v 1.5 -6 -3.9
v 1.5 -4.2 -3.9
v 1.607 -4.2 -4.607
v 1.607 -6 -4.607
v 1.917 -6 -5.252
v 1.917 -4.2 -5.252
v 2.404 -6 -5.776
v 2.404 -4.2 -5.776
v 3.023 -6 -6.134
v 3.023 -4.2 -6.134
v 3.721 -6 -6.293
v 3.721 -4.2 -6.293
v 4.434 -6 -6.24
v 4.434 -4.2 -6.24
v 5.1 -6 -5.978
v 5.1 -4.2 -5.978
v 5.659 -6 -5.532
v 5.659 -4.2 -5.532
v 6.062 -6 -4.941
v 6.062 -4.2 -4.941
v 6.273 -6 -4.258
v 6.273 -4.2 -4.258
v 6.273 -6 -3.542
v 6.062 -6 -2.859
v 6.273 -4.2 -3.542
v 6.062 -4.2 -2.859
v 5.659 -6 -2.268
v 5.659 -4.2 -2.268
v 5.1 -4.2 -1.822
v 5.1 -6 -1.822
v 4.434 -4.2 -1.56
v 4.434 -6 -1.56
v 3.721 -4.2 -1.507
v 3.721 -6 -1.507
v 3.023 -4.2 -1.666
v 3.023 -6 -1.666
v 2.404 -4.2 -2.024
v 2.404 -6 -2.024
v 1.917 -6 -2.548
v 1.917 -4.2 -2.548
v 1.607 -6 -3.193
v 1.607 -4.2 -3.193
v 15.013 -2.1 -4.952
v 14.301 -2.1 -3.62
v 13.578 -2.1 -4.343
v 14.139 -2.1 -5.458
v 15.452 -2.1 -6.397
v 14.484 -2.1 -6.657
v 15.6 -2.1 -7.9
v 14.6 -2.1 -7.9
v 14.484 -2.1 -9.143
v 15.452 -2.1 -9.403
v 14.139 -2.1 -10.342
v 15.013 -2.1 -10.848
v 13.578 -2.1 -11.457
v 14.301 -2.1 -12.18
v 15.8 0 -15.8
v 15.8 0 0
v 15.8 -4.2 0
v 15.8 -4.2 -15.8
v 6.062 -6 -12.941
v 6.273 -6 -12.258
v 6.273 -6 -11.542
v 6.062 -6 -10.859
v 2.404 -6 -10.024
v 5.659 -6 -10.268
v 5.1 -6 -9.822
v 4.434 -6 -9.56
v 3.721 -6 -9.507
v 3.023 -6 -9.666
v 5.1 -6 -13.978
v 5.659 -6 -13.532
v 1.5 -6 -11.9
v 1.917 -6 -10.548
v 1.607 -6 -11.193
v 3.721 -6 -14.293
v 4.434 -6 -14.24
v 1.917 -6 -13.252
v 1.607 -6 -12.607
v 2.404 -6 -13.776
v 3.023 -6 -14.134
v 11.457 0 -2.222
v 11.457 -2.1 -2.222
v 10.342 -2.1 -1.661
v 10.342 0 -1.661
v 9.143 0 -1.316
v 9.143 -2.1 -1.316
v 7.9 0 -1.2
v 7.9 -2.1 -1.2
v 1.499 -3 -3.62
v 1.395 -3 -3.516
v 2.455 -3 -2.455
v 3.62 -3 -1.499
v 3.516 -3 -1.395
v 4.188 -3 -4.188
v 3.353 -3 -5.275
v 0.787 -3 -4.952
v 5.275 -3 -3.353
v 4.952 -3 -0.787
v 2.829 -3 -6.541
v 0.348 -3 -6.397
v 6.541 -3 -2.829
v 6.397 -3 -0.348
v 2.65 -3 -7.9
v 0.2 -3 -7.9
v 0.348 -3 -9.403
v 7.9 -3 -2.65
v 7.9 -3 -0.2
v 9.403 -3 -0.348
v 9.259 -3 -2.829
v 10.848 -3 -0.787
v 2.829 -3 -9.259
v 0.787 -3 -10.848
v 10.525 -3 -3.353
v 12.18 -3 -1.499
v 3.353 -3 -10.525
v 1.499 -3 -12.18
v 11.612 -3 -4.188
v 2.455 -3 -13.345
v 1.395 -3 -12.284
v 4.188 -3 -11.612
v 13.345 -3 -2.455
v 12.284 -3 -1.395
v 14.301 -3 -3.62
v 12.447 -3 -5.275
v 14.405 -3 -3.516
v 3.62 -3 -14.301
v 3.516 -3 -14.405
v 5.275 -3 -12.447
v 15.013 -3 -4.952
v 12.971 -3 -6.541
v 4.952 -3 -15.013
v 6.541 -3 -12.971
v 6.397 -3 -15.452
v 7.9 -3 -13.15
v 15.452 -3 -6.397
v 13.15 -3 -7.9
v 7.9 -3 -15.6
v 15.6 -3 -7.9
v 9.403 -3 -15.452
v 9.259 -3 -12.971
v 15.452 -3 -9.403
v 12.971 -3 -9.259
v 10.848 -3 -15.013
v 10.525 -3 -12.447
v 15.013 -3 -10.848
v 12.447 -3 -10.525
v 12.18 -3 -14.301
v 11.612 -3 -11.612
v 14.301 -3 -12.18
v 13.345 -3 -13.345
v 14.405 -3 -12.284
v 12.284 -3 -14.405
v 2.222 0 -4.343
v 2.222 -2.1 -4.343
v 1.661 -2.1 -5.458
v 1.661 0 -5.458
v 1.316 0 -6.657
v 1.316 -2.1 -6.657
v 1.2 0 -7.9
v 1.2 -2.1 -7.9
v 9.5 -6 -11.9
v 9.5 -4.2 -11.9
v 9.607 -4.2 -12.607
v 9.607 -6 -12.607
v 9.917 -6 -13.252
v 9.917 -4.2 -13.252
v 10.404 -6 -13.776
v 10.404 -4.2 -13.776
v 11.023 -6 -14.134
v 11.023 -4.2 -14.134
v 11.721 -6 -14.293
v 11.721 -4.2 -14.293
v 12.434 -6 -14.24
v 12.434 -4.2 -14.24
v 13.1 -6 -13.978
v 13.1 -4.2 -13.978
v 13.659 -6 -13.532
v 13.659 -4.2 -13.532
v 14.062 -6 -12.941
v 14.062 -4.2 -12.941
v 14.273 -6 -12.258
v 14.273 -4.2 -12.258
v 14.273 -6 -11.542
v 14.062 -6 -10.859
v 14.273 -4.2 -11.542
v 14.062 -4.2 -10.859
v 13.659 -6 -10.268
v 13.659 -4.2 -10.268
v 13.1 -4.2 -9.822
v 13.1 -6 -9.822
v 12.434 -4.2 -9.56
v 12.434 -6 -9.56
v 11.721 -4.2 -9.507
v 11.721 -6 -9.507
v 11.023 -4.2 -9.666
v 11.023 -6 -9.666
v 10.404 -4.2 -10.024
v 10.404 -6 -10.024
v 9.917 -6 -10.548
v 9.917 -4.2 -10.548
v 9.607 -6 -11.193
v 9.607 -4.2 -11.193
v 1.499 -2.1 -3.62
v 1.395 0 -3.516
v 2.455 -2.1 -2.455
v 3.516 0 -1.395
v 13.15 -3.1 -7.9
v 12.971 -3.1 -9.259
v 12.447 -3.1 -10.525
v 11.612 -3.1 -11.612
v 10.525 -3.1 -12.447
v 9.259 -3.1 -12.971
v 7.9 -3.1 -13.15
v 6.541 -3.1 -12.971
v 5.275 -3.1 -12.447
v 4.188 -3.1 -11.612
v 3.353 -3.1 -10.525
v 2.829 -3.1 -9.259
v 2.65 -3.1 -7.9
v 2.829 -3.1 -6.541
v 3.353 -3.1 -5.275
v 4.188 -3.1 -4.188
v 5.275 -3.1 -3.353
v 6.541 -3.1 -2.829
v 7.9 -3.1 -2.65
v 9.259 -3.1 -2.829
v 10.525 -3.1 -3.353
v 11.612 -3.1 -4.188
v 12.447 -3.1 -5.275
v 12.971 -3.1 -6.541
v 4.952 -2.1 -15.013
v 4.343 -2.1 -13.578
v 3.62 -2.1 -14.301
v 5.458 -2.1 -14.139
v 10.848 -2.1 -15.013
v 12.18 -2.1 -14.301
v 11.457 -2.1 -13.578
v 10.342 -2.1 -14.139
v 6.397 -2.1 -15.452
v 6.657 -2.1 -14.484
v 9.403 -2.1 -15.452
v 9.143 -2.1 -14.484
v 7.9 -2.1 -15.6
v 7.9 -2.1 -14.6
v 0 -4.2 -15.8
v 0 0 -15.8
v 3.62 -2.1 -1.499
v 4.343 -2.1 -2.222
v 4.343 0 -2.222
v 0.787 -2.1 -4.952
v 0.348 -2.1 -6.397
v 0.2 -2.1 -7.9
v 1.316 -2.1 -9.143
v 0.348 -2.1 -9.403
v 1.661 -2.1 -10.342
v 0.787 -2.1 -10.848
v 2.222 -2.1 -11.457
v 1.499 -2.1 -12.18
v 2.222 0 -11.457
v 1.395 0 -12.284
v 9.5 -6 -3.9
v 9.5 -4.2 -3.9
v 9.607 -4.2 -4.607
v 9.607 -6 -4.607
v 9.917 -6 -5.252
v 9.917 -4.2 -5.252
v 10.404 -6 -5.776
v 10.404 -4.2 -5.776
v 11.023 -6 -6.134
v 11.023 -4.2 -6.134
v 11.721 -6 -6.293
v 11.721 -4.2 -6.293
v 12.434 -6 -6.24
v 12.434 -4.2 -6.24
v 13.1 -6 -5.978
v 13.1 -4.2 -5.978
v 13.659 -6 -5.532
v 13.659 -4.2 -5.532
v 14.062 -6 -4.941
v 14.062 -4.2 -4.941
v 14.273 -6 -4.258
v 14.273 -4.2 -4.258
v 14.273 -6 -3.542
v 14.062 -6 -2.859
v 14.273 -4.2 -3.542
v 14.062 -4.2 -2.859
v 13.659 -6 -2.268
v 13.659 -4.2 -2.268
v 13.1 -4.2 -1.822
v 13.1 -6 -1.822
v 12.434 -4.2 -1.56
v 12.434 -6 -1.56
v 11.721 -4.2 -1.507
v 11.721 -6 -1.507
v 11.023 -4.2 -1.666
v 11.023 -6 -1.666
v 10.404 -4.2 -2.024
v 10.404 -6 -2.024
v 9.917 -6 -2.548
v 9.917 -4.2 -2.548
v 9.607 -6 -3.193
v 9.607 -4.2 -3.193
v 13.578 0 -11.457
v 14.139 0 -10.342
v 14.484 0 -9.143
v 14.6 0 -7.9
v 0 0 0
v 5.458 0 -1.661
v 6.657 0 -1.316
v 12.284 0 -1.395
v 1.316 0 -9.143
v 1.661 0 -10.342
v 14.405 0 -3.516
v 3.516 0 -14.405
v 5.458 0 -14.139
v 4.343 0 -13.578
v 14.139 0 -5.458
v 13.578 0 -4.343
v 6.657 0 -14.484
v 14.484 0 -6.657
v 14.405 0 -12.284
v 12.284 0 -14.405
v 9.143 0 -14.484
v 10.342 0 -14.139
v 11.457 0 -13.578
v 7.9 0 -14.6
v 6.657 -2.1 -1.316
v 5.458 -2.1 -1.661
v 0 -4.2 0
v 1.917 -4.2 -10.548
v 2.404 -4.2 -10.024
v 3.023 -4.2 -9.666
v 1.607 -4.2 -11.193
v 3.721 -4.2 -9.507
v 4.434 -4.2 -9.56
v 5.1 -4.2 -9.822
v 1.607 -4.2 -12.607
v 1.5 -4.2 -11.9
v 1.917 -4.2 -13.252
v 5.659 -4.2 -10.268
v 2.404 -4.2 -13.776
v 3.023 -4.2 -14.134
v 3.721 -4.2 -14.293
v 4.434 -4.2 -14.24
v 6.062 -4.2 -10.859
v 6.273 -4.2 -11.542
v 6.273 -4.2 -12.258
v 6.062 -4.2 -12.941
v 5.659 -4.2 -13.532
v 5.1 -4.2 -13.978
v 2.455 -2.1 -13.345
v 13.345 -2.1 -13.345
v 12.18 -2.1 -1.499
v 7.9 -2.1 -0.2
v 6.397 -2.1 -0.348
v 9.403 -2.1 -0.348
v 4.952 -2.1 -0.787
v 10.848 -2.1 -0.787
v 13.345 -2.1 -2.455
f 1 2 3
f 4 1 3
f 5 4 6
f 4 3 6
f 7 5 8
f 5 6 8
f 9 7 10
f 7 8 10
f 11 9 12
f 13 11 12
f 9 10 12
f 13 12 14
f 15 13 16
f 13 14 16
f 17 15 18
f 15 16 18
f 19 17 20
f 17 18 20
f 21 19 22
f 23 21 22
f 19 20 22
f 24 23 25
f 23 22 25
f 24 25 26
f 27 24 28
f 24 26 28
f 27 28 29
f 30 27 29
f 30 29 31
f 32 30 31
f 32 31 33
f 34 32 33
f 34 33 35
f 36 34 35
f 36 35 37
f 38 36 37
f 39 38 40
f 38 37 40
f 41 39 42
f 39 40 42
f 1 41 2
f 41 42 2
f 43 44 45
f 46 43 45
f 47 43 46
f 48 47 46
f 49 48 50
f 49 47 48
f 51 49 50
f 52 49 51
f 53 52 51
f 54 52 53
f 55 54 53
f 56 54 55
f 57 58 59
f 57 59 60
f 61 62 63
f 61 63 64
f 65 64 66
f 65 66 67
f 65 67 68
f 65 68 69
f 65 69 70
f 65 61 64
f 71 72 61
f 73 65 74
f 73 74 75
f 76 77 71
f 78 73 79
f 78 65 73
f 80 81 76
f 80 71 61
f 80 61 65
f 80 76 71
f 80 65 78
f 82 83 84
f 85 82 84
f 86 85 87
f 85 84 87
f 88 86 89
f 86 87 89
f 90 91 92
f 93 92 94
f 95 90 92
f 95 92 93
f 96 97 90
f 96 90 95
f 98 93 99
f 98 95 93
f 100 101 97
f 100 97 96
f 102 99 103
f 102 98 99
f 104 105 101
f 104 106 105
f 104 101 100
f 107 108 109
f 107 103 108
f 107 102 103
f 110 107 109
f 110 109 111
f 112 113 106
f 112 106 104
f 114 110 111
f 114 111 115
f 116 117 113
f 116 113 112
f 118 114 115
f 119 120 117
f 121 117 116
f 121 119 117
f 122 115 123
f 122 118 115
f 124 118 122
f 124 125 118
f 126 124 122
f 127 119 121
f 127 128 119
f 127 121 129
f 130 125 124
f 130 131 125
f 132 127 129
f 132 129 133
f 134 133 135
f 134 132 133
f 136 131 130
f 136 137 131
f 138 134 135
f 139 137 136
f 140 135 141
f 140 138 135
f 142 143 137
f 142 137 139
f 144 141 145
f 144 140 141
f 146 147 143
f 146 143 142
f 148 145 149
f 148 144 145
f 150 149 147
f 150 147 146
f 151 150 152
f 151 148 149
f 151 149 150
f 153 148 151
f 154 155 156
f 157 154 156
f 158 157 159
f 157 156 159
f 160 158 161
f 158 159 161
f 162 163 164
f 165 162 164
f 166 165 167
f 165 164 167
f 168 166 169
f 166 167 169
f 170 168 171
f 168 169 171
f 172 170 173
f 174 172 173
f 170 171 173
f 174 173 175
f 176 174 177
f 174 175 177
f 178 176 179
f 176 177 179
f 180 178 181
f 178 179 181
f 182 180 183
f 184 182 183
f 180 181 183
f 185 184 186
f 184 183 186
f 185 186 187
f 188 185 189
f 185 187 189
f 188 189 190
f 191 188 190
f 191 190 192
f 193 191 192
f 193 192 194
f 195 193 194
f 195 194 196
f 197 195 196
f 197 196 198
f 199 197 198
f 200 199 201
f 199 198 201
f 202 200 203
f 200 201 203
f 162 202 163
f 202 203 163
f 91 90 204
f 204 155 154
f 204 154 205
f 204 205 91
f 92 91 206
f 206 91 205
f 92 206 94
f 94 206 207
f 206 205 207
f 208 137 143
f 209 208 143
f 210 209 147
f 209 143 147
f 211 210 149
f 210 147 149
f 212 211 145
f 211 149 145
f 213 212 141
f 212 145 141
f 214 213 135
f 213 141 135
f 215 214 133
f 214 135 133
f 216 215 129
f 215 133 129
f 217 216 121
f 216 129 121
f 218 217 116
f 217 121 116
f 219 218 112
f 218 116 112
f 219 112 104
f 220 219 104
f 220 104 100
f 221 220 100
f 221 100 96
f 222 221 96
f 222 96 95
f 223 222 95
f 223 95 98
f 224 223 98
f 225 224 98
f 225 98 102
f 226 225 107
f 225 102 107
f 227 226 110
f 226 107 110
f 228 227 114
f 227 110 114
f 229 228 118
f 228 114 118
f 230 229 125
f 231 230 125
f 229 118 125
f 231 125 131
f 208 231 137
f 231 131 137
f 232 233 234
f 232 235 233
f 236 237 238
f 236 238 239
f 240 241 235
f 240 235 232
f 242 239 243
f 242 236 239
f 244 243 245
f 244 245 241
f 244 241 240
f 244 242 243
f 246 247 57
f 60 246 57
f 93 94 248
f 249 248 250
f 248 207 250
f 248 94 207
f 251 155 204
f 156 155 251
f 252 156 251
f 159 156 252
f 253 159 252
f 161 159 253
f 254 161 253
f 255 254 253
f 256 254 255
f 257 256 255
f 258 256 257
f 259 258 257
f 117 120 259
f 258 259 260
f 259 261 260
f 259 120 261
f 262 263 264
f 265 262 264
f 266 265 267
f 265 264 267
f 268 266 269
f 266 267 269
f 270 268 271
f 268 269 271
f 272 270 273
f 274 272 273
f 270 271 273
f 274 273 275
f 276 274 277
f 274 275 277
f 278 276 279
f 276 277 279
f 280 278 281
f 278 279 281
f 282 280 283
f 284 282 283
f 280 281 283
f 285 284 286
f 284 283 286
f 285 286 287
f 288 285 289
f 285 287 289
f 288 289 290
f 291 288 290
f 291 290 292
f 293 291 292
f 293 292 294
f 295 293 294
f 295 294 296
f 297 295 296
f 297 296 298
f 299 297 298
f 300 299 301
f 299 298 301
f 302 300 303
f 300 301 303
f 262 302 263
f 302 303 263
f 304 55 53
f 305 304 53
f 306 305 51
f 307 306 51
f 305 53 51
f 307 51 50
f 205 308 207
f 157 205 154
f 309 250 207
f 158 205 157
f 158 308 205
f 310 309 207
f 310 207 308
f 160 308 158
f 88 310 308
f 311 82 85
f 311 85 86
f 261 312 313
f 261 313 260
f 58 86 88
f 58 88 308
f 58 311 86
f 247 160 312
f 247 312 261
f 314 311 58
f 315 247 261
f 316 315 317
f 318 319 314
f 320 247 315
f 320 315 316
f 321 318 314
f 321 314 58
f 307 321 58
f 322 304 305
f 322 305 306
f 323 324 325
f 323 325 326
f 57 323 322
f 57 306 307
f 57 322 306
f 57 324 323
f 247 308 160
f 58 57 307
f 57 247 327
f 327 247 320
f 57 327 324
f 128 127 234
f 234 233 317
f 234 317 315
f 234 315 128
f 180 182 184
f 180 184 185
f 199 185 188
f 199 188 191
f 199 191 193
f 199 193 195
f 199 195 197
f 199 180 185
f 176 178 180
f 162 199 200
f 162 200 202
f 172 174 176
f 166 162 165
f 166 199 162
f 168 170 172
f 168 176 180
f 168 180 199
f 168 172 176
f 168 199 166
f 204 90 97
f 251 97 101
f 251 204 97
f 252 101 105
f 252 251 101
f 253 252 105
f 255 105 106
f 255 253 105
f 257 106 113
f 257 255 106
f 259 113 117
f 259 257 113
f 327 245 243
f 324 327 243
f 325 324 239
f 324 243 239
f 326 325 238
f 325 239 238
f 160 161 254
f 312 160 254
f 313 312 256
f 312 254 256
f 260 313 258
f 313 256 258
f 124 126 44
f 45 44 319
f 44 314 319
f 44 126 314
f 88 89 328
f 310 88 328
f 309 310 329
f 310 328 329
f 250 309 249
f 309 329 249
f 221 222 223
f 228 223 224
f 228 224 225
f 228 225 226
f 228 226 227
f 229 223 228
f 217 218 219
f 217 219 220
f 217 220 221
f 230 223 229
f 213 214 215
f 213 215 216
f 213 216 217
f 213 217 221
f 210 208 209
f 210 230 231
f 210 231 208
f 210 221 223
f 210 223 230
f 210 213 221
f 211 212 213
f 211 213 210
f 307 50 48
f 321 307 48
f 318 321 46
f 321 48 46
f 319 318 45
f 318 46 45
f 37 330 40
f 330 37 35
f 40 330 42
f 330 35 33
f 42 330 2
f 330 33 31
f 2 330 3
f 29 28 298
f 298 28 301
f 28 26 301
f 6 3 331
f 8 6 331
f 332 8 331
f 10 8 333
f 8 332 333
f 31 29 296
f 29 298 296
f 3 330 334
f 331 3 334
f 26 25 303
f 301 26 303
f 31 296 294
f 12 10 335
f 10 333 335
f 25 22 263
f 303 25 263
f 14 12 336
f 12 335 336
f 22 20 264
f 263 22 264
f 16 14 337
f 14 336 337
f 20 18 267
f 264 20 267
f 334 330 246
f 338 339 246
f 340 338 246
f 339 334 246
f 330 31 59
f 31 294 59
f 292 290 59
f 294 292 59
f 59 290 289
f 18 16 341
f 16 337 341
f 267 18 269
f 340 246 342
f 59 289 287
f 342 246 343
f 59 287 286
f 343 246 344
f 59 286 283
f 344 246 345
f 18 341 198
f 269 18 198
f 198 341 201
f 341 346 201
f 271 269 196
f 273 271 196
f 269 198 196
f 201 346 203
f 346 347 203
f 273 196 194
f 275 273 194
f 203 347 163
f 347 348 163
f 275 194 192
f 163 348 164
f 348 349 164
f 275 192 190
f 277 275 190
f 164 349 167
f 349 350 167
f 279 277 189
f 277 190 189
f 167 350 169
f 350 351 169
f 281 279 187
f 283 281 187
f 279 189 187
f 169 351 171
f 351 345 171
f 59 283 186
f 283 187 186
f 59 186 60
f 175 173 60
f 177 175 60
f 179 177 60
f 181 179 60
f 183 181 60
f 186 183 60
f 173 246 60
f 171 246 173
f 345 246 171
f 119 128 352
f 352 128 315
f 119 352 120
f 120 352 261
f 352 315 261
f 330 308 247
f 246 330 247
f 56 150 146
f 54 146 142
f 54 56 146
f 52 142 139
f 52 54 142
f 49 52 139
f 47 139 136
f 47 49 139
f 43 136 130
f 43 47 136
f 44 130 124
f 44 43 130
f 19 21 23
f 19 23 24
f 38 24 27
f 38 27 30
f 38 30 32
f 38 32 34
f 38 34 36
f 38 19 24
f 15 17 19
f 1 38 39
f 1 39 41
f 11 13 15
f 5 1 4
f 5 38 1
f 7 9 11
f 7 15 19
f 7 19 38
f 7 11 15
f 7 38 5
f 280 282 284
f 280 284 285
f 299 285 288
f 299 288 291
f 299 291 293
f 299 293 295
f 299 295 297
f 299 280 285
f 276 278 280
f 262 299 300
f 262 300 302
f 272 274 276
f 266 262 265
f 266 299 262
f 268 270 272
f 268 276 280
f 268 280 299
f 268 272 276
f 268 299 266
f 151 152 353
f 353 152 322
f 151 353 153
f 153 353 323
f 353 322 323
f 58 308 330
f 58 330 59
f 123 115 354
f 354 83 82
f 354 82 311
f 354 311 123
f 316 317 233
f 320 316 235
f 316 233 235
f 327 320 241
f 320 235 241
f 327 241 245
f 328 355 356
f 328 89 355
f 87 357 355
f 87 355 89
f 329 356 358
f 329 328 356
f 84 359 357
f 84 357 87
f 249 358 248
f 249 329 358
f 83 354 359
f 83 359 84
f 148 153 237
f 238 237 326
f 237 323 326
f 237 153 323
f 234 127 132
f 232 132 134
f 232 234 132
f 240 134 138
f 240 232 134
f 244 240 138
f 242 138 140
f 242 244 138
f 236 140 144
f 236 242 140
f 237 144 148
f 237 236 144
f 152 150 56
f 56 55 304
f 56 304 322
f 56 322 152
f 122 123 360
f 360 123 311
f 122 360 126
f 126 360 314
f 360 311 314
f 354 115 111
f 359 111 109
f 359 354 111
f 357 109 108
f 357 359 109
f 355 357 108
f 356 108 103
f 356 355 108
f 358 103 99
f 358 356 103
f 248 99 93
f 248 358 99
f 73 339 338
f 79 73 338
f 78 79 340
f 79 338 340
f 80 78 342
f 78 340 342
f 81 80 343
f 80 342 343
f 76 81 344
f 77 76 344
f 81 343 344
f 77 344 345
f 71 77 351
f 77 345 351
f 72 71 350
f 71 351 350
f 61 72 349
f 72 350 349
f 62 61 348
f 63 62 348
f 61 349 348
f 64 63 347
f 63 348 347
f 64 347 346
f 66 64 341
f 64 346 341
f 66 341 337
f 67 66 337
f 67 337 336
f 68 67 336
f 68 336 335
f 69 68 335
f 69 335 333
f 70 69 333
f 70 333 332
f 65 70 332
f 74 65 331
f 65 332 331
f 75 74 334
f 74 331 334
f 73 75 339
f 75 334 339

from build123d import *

# Parameters (mm, degrees)
SKETCH2_W            = 15.8
SKETCH2_H            = 15.8
BOSS_EXTRUDE2_DEPTH  = 4.2
SKETCH4_W            = 13.4
SKETCH4_H            = 13.4
CUT_EXTRUDE1_DEPTH   = 3
SKETCH6_R            = 2.4
BOSS_EXTRUDE4_DEPTH  = 1.8
LPATTERN1_COUNT      = 2
LPATTERN1_PITCH      = 8
LPATTERN1_COUNT_DIR2 = 2
LPATTERN1_PITCH_DIR2 = 8
SKETCH8_R            = 5.25
CUT_EXTRUDE2_DEPTH   = 0.1
BOSS_EXTRUDE9_DEPTH  = 3
CUT_EXTRUDE3_DEPTH   = 3
CIRPATTERN3_COUNT    = 4
SKETCH19_W           = 1.484523383
SKETCH19_H           = 0.9


with BuildPart() as part:
    # Sketch2 → Boss-Extrude2 (new body)
    with BuildSketch(Plane(origin=(0, 0, 0), x_dir=(1, 0, 0), z_dir=(0, 1, 0))):
        with Locations((7.9, 7.9)):
            Rectangle(SKETCH2_W, SKETCH2_H)
    extrude(amount=-BOSS_EXTRUDE2_DEPTH)

    # Sketch4 → Cut-Extrude1 (cut)
    with BuildSketch(Plane(origin=(0, 0, 0), x_dir=(1, 0, 0), z_dir=(0, 1, 0))):
        with Locations((7.9, 7.9)):
            Rectangle(SKETCH4_W, SKETCH4_H)
    extrude(amount=-CUT_EXTRUDE1_DEPTH, mode=Mode.SUBTRACT)

    # Sketch6 → Boss-Extrude4 (add)
    with BuildSketch(Plane(origin=(0, -4.2, 0), x_dir=(-1, 0, 0), z_dir=(0, -1, 0))):
        with Locations((-11.9, 11.9)):
            Circle(SKETCH6_R)
    boss_extrude4 = extrude(amount=BOSS_EXTRUDE4_DEPTH)

    # LPattern1: Boss-Extrude4 2 × 2
    with Locations(*[(-j * LPATTERN1_PITCH_DIR2, 0, i * LPATTERN1_PITCH) for i in range(LPATTERN1_COUNT) for j in range(LPATTERN1_COUNT_DIR2) if (i, j) != (0, 0)]):
        add(boss_extrude4)

    # Sketch8 → Cut-Extrude2 (cut)
    with BuildSketch(Plane(origin=(0, -3, 0), x_dir=(1, 0, 0), z_dir=(0, 1, 0))):
        with Locations((7.9, 7.9)):
            Circle(SKETCH8_R)
    extrude(amount=-CUT_EXTRUDE2_DEPTH, mode=Mode.SUBTRACT)

    # Sketch11 → Boss-Extrude9 (add)
    with BuildSketch(Plane(origin=(0, -3, 0), x_dir=(1, 0, 0), z_dir=(0, 1, 0))):
        with BuildLine():
            Line((7.899999971, 14.6), (1.2, 14.6))
            Line((1.2, 14.6), (1.2, 7.9))
            ThreePointArc((1.2, 7.9), (3.162384556, 12.637615424), (7.899999971, 14.6))
        make_face()
        with BuildLine():
            Line((14.6, 14.6), (7.899999971, 14.6))
            ThreePointArc((7.899999971, 14.6), (12.637615424, 12.637615444), (14.6, 7.9))
            Line((14.6, 7.9), (14.6, 14.6))
        make_face()
        with BuildLine():
            ThreePointArc((7.900000011, 1.2), (3.16238457, 3.162384562), (1.2, 7.9))
            Line((1.2, 7.9), (1.2, 1.2))
            Line((1.2, 1.2), (7.900000011, 1.2))
        make_face()
        with BuildLine():
            Line((14.6, 1.2), (14.6, 7.9))
            ThreePointArc((14.6, 7.9), (12.637615438, 3.16238457), (7.900000011, 1.2))
            Line((7.900000011, 1.2), (14.6, 1.2))
        make_face()
    extrude(amount=BOSS_EXTRUDE9_DEPTH)

    # Sketch12 → Cut-Extrude3 (cut)
    with BuildSketch(Plane(origin=(0, 0, 0), x_dir=(1, 0, 0), z_dir=(0, 1, 0))):
        Polygon((3.162384566, 12.637615434), (2.455277785, 13.344722215), (1.394617613, 12.284062043), (2.101724394, 11.576955262), align=None)
        with BuildLine():
            ThreePointArc((2.221981276, 11.45669838), (2.658816927, 12.073727351), (3.162384566, 12.637615434))
            Line((3.162384566, 12.637615434), (2.101724394, 11.576955262))
            Line((2.101724394, 11.576955262), (2.221981276, 11.45669838))
        make_face()
        with BuildLine():
            Line((4.223044738, 13.698275606), (3.162384566, 12.637615434))
            ThreePointArc((3.162384566, 12.637615434), (3.726272649, 13.141183073), (4.34330162, 13.578018724))
            Line((4.34330162, 13.578018724), (4.223044738, 13.698275606))
        make_face()
        Polygon((3.515937957, 14.405382387), (2.455277785, 13.344722215), (3.162384566, 12.637615434), (4.223044738, 13.698275606), align=None)
        with BuildLine():
            ThreePointArc((4.34330162, 13.578018724), (3.726272649, 13.141183073), (3.162384566, 12.637615434))
            ThreePointArc((3.162384566, 12.637615434), (2.658816927, 12.073727351), (2.221981276, 11.45669838))
            Line((2.221981276, 11.45669838), (2.423581348, 11.255098309))
            Line((2.423581348, 11.255098309), (4.544901691, 13.376418652))
            Line((4.544901691, 13.376418652), (4.34330162, 13.578018724))
        make_face()
        with BuildLine():
            ThreePointArc((14.6, 7.9), (11.145005458, 13.761735202), (4.34330162, 13.578018724))
            Line((4.34330162, 13.578018724), (4.544901691, 13.376418652))
            Line((4.544901691, 13.376418652), (2.423581348, 11.255098309))
            Line((2.423581348, 11.255098309), (2.221981276, 11.45669838))
            ThreePointArc((2.221981276, 11.45669838), (6.049692654, 1.460561925), (14.6, 7.9))
        make_face()
    cut_extrude3 = extrude(amount=-CUT_EXTRUDE3_DEPTH, mode=Mode.SUBTRACT)

    # CirPattern3: Cut-Extrude3 ×4 about axis
    cirpattern3_axis = Axis((7.9, 0, -7.9), (0, 1, 0))
    for i in range(1, CIRPATTERN3_COUNT):
        add(cut_extrude3.rotate(cirpattern3_axis, i * 360 / CIRPATTERN3_COUNT), mode=Mode.SUBTRACT)

    # Sketch19 → Cut-Revolve1 (revolve, cut)
    with BuildSketch(Plane(origin=(7.9, 0, -7.9), x_dir=(0.707106781, 0, 0.707106781), z_dir=(-0.707106781, 0, 0.707106781))):
        with Locations((-6.957738308, -2.55)):
            Rectangle(SKETCH19_W, SKETCH19_H)
    revolve(axis=Axis((7.9, 0, -7.9), (0, -1, 0)), mode=Mode.SUBTRACT)


solid = part.part
